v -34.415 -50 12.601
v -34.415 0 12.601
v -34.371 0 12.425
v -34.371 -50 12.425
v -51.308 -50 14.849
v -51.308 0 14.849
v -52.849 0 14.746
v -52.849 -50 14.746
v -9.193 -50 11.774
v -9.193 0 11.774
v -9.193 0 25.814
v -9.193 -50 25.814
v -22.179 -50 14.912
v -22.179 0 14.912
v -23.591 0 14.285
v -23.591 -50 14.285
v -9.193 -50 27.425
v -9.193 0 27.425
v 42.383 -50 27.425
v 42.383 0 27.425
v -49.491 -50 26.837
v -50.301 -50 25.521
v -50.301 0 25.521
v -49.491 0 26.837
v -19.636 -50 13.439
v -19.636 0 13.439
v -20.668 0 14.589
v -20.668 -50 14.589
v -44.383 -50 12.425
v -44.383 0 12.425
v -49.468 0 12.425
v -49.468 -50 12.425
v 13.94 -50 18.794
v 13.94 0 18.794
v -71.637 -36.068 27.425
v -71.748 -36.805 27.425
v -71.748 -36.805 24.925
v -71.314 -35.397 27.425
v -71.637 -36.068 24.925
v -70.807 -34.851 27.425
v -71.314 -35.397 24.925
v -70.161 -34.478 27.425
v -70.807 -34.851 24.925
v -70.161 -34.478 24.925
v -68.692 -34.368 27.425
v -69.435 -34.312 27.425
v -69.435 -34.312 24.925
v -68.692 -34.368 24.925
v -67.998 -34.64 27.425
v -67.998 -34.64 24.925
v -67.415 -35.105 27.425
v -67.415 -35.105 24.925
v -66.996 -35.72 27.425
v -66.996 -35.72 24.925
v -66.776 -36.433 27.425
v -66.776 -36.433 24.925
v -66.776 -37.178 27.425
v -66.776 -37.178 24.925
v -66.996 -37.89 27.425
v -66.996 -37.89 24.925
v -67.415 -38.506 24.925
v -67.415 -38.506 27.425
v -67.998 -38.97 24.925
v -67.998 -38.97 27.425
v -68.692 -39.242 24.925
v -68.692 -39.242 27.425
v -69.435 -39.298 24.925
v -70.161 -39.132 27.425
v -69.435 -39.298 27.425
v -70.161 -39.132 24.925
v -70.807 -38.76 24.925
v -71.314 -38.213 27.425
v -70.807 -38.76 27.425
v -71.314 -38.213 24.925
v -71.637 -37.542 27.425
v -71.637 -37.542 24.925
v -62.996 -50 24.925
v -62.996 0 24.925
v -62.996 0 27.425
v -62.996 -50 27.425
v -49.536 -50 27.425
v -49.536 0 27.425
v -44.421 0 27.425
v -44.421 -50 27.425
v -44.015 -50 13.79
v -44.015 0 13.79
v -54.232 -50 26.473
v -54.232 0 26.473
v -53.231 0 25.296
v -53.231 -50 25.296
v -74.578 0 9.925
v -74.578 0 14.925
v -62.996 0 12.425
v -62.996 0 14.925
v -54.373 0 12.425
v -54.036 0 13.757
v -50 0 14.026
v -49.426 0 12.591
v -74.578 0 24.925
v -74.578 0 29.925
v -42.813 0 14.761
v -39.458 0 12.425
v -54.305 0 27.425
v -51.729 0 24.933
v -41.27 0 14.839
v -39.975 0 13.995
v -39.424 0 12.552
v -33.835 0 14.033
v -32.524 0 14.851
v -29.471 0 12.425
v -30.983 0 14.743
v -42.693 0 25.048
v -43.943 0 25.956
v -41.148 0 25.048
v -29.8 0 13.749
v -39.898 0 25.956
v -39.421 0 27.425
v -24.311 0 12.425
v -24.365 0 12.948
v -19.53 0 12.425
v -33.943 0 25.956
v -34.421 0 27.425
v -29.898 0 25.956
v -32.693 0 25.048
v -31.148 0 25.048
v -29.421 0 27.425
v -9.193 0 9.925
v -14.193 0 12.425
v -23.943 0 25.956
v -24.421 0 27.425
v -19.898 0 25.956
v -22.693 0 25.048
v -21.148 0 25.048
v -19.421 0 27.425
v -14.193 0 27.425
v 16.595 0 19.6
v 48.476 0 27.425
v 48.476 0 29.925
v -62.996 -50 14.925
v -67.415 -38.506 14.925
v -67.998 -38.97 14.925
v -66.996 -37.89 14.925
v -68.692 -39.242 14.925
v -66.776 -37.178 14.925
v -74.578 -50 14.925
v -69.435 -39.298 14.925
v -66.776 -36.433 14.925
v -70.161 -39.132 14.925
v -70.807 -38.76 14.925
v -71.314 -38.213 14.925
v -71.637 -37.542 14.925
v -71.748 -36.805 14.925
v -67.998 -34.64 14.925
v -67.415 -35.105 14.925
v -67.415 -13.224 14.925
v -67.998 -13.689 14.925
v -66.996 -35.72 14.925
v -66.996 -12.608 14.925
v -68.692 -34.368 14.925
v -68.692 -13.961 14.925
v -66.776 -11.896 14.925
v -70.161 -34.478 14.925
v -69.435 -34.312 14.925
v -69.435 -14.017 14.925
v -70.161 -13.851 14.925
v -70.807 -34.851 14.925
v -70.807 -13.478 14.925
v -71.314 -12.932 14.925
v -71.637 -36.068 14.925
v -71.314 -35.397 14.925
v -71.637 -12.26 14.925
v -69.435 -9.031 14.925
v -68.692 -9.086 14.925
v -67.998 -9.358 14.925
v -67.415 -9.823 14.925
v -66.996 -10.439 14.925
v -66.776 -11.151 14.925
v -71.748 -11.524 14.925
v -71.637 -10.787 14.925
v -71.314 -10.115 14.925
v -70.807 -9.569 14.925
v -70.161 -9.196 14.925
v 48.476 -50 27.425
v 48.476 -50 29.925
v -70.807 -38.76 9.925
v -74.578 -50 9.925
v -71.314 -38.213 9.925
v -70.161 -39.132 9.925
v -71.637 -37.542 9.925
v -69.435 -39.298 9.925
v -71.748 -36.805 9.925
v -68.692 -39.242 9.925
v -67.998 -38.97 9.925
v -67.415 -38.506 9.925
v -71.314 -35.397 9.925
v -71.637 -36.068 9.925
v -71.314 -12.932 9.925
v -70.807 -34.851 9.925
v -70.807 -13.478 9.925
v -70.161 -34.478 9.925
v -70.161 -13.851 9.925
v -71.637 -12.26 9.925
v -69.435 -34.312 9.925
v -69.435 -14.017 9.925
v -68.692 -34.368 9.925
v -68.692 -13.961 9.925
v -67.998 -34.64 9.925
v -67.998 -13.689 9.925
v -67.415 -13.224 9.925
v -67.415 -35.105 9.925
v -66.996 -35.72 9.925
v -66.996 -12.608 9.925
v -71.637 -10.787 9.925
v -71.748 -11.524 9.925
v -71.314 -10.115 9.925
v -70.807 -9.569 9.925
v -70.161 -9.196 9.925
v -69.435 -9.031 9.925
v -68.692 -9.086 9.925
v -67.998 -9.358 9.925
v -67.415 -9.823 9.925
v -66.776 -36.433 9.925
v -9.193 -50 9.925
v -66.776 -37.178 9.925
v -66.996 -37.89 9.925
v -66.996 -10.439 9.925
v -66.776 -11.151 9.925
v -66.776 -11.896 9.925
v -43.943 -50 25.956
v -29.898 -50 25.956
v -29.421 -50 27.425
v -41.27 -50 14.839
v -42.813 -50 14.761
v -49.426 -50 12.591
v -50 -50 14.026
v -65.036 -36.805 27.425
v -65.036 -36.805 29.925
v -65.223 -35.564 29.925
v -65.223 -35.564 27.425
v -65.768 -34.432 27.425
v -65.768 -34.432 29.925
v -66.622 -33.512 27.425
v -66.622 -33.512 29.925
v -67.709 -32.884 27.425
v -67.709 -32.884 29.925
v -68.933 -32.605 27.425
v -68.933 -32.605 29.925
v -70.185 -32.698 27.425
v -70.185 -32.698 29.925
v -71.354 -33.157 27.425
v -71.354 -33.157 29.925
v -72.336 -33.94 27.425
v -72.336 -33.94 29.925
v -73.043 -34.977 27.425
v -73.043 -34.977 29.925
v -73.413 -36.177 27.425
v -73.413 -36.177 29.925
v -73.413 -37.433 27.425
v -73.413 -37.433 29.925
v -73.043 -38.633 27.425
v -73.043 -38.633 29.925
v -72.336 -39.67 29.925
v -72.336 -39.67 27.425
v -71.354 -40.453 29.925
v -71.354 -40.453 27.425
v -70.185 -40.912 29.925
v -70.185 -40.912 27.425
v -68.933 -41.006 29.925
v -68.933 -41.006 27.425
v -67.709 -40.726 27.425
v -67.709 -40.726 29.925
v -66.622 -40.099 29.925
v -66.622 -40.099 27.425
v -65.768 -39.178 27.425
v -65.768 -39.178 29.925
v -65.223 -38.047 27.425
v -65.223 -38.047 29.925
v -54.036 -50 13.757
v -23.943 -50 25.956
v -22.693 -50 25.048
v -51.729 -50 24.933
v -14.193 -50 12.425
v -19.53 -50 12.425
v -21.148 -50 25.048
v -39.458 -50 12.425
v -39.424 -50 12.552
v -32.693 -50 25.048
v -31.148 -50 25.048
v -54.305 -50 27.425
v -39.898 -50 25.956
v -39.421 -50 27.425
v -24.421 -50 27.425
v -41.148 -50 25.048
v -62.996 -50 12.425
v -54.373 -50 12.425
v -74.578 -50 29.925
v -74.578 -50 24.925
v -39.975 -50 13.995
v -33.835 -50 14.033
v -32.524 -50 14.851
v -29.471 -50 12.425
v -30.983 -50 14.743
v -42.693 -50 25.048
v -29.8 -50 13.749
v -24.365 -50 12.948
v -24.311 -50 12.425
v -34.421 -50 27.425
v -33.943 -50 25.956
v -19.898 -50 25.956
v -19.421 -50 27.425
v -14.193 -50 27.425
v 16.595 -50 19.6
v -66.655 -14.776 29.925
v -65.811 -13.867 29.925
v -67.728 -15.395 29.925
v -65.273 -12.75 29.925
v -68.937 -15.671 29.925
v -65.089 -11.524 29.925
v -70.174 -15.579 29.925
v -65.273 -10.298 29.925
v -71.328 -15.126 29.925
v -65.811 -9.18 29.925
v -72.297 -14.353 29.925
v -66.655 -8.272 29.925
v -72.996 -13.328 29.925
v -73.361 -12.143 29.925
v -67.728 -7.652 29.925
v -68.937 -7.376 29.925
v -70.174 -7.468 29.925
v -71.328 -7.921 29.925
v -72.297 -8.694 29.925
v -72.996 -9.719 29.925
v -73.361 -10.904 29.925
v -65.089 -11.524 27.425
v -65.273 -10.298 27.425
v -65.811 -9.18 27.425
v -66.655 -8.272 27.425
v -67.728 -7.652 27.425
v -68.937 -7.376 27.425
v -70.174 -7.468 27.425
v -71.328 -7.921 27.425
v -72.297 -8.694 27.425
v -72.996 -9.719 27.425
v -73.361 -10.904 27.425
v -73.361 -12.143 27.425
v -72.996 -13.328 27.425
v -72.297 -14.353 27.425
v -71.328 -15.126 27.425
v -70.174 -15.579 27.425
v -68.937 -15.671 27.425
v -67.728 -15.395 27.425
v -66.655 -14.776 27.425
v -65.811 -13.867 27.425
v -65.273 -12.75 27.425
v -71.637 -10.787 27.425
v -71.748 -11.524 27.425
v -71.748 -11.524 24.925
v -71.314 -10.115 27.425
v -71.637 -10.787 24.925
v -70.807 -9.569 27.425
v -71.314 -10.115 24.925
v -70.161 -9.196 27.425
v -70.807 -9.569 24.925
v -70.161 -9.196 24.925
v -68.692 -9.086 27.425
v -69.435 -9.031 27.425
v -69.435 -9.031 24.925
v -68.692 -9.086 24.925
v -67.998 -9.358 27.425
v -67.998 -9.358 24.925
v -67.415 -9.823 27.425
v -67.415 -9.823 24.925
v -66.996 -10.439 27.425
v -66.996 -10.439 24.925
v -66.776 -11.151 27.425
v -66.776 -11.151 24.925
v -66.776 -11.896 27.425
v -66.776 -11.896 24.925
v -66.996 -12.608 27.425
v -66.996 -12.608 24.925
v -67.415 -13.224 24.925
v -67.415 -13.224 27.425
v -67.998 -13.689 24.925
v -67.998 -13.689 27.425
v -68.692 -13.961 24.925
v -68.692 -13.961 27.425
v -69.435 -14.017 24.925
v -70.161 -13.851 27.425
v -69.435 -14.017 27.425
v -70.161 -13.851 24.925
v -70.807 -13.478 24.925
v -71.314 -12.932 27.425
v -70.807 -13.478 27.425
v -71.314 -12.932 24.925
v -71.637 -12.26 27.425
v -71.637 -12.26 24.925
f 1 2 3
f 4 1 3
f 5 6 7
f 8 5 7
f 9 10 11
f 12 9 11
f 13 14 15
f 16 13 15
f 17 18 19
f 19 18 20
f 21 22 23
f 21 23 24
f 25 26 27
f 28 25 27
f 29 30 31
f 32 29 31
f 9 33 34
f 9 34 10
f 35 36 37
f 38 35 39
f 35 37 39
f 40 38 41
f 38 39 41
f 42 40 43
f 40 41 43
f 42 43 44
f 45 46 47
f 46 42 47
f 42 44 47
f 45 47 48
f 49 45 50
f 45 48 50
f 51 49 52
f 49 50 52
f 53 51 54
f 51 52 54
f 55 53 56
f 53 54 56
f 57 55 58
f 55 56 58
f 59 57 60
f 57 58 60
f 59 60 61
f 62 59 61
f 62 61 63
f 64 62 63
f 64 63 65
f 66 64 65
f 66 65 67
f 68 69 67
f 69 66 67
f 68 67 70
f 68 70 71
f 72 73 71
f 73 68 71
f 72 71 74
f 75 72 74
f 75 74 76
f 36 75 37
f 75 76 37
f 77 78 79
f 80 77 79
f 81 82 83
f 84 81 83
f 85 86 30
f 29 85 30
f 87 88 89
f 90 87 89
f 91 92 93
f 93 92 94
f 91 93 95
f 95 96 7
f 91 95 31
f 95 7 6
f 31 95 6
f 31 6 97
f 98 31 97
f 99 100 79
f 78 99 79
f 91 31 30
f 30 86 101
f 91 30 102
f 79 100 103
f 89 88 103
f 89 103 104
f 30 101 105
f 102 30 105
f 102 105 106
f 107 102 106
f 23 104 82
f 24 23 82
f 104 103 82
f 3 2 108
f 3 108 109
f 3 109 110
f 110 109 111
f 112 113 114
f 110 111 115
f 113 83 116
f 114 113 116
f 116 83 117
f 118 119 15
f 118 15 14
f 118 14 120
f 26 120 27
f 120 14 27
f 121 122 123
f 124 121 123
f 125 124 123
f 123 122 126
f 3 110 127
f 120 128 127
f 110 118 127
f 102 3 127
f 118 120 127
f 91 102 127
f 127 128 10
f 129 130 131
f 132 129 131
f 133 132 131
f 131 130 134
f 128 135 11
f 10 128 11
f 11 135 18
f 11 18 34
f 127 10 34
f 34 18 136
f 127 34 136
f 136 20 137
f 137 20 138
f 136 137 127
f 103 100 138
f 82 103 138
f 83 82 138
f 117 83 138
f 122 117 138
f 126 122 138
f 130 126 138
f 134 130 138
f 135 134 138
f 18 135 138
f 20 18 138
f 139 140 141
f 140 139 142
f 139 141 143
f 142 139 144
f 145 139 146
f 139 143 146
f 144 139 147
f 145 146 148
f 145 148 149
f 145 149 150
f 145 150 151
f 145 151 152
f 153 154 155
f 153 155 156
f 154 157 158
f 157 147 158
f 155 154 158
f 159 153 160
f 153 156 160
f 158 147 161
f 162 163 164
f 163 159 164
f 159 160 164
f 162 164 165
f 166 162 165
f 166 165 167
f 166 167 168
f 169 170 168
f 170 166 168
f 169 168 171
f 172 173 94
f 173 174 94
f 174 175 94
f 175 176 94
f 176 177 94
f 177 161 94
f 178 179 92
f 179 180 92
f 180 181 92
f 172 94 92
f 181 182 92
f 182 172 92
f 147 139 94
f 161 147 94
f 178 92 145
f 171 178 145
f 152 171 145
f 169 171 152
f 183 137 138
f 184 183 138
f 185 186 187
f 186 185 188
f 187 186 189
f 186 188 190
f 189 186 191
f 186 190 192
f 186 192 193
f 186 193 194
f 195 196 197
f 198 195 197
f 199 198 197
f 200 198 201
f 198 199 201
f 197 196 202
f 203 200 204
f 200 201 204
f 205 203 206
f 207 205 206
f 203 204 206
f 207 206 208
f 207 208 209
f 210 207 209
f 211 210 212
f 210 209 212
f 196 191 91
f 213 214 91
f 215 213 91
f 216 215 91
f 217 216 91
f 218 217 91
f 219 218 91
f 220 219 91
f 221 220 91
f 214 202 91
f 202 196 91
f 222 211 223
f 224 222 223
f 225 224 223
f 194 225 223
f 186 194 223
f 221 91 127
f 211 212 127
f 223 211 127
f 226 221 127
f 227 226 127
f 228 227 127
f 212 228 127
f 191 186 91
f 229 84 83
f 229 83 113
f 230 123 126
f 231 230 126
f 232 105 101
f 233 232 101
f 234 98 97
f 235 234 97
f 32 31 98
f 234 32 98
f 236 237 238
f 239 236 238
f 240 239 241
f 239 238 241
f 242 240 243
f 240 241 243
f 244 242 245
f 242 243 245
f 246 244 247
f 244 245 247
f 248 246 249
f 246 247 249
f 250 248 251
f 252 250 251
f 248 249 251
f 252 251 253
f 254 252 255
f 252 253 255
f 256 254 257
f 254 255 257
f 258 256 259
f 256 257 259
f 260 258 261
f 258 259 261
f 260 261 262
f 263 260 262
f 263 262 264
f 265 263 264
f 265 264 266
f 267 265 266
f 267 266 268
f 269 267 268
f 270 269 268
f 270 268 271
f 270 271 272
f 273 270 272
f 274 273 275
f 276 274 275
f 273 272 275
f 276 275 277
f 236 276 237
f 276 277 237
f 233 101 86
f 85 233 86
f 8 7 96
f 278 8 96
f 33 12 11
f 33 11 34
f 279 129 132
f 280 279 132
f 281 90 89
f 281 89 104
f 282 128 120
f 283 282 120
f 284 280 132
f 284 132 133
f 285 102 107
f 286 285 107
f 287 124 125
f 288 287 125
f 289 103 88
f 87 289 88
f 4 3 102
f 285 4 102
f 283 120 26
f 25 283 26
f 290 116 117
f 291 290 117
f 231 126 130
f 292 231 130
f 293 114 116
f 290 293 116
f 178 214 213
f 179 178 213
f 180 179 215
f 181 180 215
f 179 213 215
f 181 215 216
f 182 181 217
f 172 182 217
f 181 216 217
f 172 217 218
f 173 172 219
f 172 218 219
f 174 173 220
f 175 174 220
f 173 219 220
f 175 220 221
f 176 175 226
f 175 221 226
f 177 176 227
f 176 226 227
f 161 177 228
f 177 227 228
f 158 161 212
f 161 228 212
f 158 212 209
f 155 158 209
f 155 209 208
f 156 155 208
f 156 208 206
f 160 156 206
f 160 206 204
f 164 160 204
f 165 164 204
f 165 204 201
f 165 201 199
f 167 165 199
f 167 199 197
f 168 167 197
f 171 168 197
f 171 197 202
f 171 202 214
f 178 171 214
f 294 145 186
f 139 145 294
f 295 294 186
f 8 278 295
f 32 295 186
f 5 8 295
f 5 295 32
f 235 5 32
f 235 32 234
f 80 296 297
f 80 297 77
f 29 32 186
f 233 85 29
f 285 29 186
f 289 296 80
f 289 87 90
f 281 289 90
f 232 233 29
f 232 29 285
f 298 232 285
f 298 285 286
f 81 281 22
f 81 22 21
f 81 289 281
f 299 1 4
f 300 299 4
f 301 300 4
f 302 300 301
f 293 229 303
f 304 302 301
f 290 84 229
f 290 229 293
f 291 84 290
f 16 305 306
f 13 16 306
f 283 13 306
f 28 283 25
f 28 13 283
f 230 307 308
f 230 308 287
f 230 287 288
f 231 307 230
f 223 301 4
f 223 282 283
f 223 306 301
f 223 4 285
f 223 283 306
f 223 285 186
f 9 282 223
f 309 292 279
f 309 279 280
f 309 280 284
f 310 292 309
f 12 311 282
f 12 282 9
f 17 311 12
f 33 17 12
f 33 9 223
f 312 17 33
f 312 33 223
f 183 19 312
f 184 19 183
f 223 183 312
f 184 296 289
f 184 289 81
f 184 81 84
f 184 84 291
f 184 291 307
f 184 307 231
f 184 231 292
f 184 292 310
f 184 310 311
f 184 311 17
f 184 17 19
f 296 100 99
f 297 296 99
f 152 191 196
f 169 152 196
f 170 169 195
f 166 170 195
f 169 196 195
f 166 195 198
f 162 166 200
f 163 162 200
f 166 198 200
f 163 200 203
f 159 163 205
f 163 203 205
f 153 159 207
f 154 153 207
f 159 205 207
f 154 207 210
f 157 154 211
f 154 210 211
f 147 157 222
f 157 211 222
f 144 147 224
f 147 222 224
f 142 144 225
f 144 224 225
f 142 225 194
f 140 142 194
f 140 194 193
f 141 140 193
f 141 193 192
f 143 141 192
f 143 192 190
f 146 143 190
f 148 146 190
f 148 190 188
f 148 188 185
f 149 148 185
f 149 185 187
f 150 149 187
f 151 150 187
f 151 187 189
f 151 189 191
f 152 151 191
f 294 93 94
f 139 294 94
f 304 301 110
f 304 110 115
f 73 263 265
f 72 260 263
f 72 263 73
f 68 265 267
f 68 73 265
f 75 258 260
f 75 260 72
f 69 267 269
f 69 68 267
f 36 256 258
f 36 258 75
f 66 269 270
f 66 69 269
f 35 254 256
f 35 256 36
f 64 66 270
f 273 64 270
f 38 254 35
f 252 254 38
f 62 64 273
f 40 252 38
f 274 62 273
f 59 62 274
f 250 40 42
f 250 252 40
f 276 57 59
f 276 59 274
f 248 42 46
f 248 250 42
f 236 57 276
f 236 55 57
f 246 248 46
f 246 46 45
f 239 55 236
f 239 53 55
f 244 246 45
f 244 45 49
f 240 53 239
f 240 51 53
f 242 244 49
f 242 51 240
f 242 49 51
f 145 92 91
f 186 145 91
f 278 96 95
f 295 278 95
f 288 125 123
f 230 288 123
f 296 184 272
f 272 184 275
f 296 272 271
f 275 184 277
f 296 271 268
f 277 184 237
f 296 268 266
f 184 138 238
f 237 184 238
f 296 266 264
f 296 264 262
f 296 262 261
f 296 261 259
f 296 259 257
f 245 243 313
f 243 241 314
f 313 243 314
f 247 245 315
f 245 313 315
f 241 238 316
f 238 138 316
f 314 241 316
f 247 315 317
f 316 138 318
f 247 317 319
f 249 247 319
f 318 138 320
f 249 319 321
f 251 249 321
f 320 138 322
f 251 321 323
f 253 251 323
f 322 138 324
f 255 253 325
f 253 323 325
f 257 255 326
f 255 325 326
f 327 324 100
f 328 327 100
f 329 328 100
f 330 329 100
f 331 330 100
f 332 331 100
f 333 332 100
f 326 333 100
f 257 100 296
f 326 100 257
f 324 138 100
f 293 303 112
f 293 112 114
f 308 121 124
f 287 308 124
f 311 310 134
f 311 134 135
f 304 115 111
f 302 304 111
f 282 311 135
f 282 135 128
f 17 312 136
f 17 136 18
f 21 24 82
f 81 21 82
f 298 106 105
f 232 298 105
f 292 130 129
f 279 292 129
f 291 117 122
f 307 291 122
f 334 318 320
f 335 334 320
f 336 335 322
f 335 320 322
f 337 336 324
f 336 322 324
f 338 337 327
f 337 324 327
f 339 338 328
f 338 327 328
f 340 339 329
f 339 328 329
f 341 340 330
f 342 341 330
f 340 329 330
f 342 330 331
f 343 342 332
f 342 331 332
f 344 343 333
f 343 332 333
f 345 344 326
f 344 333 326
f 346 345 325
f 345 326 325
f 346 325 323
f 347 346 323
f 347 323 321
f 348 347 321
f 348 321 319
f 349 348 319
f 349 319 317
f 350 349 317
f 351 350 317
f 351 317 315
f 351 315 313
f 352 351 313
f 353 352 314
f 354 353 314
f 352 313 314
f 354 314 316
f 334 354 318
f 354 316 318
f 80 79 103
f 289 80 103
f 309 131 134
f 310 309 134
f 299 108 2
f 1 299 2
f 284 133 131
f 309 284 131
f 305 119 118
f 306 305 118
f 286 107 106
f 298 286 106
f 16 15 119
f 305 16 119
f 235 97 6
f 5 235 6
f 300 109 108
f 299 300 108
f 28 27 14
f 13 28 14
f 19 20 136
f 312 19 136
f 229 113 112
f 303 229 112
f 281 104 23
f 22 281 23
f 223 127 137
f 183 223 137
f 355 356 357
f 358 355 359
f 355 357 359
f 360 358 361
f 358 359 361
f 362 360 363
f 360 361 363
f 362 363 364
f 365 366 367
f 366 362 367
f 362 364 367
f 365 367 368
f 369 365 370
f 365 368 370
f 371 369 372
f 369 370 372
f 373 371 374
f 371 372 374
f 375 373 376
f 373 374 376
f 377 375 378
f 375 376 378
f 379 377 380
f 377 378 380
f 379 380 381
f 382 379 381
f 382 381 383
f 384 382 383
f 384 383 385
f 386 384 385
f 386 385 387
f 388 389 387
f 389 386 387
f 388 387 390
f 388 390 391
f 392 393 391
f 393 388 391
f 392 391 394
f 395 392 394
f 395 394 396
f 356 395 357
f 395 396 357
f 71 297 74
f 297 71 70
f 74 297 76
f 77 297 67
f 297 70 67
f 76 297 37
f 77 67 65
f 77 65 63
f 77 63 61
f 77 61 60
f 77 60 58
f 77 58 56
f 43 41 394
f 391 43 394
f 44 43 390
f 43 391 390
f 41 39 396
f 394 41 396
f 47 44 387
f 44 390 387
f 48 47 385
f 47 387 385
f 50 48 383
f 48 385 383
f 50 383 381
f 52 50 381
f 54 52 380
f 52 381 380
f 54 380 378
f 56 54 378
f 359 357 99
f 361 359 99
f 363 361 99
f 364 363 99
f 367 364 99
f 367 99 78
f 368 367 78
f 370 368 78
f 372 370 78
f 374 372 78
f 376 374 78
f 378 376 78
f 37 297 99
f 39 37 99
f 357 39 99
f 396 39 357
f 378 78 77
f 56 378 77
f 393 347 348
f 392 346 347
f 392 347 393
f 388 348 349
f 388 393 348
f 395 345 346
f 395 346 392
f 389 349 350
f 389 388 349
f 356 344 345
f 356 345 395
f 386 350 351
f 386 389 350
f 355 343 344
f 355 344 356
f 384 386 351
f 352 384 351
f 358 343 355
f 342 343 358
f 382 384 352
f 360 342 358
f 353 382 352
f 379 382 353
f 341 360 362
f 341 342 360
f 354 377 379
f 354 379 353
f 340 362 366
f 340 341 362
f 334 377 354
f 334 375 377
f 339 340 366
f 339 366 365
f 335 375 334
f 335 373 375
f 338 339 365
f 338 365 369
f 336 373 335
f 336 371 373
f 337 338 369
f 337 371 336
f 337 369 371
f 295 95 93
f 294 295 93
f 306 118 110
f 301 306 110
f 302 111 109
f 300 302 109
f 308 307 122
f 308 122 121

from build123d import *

# Parameters (mm, degrees)
F1_DEPTH = 50
F3_D     = 5
F3_DEPTH = 30
F4_R     = 4.159464
F4_R_2   = 2.5
F4_R_3   = 4.212355
F5_DEPTH = 2.5


with BuildPart() as f1:
    # F0 (on Front) → F1 (new body)
    with BuildSketch(Plane.XZ):
        Polygon((-74.577573, 9.925295), (-62.995659, 9.925295), (-62.995659, 12.425295), (-62.995659, 14.925295), (-74.577573, 14.925295), align=None)
        Polygon((-62.995659, 29.925295), (-74.577573, 29.925295), (-74.577573, 24.925295), (-62.995659, 24.925295), (-62.995659, 27.425295), align=None)
        Polygon((-49.536098, 27.425295), (-54.305424, 27.425295), (-54.23216, 26.4727), (-53.230801, 25.296023), (-51.729051, 24.932656), (-50.300528, 25.521392), (-49.490879, 26.837354), align=None)
        Polygon((-14.193381, 29.925295), (-62.995659, 29.925295), (-62.995659, 27.425295), (-54.305424, 27.425295), (-54.350643, 28.013235), (-53.540994, 29.329197), (-52.112471, 29.917933), (-50.610722, 29.554566), (-49.609363, 28.37789), (-49.536098, 27.425295), (-44.420761, 27.425295), (-43.943304, 28.894758), (-42.693304, 29.802936), (-41.148219, 29.802936), (-39.898219, 28.894758), (-39.420761, 27.425295), (-34.420761, 27.425295), (-33.943304, 28.894758), (-32.693304, 29.802936), (-31.148219, 29.802936), (-29.898219, 28.894758), (-29.420761, 27.425295), (-24.420761, 27.425295), (-23.943304, 28.894758), (-22.693304, 29.802936), (-21.148219, 29.802936), (-19.898219, 28.894758), (-19.420761, 27.425295), (-14.193381, 27.425295), align=None)
        Polygon((-54.350643, 28.013235), (-54.305424, 27.425295), (-49.536098, 27.425295), (-49.609363, 28.37789), (-50.610722, 29.554566), (-52.112471, 29.917933), (-53.540994, 29.329197), align=None)
        Polygon((-43.943304, 28.894758), (-44.420761, 27.425295), (-39.420761, 27.425295), (-39.898219, 28.894758), (-41.148219, 29.802936), (-42.693304, 29.802936), align=None)
        Polygon((-39.420761, 27.425295), (-44.420761, 27.425295), (-43.943304, 25.955832), (-42.693304, 25.047653), (-41.148219, 25.047653), (-39.898219, 25.955832), align=None)
        Polygon((-29.898219, 25.955832), (-29.420761, 27.425295), (-34.420761, 27.425295), (-33.943304, 25.955832), (-32.693304, 25.047653), (-31.148219, 25.047653), align=None)
        Polygon((-34.420761, 27.425295), (-29.420761, 27.425295), (-29.898219, 28.894758), (-31.148219, 29.802936), (-32.693304, 29.802936), (-33.943304, 28.894758), align=None)
        Polygon((-24.420761, 27.425295), (-19.420761, 27.425295), (-19.898219, 28.894758), (-21.148219, 29.802936), (-22.693304, 29.802936), (-23.943304, 28.894758), align=None)
        Polygon((-19.898219, 25.955832), (-19.420761, 27.425295), (-24.420761, 27.425295), (-23.943304, 25.955832), (-22.693304, 25.047653), (-21.148219, 25.047653), align=None)
        Polygon((-54.036331, 13.757347), (-54.3733, 12.425295), (-49.468223, 12.425295), (-49.426269, 12.591143), (-50.000157, 14.025695), (-51.307652, 14.848948), (-52.849333, 14.746448), align=None)
        Polygon((-49.468223, 12.425295), (-54.3733, 12.425295), (-54.415254, 12.259447), (-53.841365, 10.824895), (-52.533871, 10.001641), (-50.99219, 10.104141), (-49.805191, 11.093243), align=None)
        Polygon((-44.383395, 12.425295), (-39.458127, 12.425295), (-39.42397, 12.551915), (-39.97524, 13.99531), (-41.269633, 14.839012), (-42.812735, 14.760757), (-44.015134, 13.790434), align=None)
        Polygon((-39.826389, 11.060155), (-39.458127, 12.425295), (-44.383395, 12.425295), (-44.417553, 12.298674), (-43.866282, 10.85528), (-42.571889, 10.011577), (-41.028787, 10.089833), align=None)
        Polygon((-34.370867, 12.425295), (-29.470655, 12.425295), (-29.799939, 13.748969), (-30.983016, 14.742758), (-32.52428, 14.851354), (-33.83502, 14.033279), (-34.414579, 12.601008), align=None)
        Polygon((-29.426944, 12.249582), (-29.470655, 12.425295), (-34.370867, 12.425295), (-34.041583, 11.10162), (-32.858506, 10.107832), (-31.317242, 9.999235), (-30.006502, 10.817311), align=None)
        Polygon((-24.31116, 12.425295), (-19.530363, 12.425295), (-19.635516, 13.439028), (-20.667817, 14.588655), (-22.1787, 14.911953), (-23.591059, 14.285431), (-24.365421, 12.9484), align=None)
        Polygon((-19.476102, 11.902189), (-19.530363, 12.425295), (-24.31116, 12.425295), (-24.206006, 11.411561), (-23.173706, 10.261934), (-21.662823, 9.938637), (-20.250464, 10.565158), align=None)
        Polygon((-14.193381, 9.925295), (-14.193381, 12.425295), (-19.530363, 12.425295), (-19.476102, 11.902189), (-20.250464, 10.565158), (-21.662823, 9.938637), (-23.173706, 10.261934), (-24.206006, 11.411561), (-24.31116, 12.425295), (-29.470655, 12.425295), (-29.426944, 12.249582), (-30.006502, 10.817311), (-31.317242, 9.999235), (-32.858506, 10.107832), (-34.041583, 11.10162), (-34.370867, 12.425295), (-39.458127, 12.425295), (-39.826389, 11.060155), (-41.028787, 10.089833), (-42.571889, 10.011577), (-43.866282, 10.85528), (-44.417553, 12.298674), (-44.383395, 12.425295), (-49.468223, 12.425295), (-49.805191, 11.093243), (-50.99219, 10.104141), (-52.533871, 10.001641), (-53.841365, 10.824895), (-54.415254, 12.259447), (-54.3733, 12.425295), (-62.995659, 12.425295), (-62.995659, 9.925295), align=None)
        Polygon((-9.193381, 29.925295), (-14.193381, 29.925295), (-14.193381, 27.425295), (-14.193381, 12.425295), (-14.193381, 9.925295), (-9.193381, 9.925295), (-9.193381, 11.774359), (-9.193381, 25.814013), (-9.193381, 27.425295), align=None)
        Polygon((48.476379, 29.925295), (-9.193381, 29.925295), (-9.193381, 27.425295), (42.382944, 27.425295), (48.476379, 27.425295), align=None)
        Polygon((16.594782, 19.599827), (-9.193381, 27.425295), (-9.193381, 25.814013), (13.939861, 18.794186), align=None)
        Polygon((48.476379, 27.425295), (42.382944, 27.425295), (16.594782, 19.599827), (13.939861, 18.794186), (-9.193381, 11.774359), (-9.193381, 9.925295), align=None)
    extrude(amount=F1_DEPTH)

    # F3
    with Locations(Plane.XY.offset(29.925295)):
        with Locations((-69.248043, -11.523538), (-69.248043, -36.80516)):
            Hole(F3_D / 2, depth=F3_DEPTH)

    # F4 (on face) → F5 (cut)
    with BuildSketch(Plane.XY.offset(29.925295)):
        with Locations((-69.248043, -11.523538)):
            Circle(F4_R)
        with Locations((-69.248043, -11.523538)):
            Circle(F4_R_2, mode=Mode.SUBTRACT)
        with Locations((-69.248043, -36.80516)):
            Circle(F4_R_3)
        with Locations((-69.248043, -36.80516)):
            Circle(F4_R_2, mode=Mode.SUBTRACT)
    extrude(amount=-F5_DEPTH, mode=Mode.SUBTRACT)


solid = f1.part
